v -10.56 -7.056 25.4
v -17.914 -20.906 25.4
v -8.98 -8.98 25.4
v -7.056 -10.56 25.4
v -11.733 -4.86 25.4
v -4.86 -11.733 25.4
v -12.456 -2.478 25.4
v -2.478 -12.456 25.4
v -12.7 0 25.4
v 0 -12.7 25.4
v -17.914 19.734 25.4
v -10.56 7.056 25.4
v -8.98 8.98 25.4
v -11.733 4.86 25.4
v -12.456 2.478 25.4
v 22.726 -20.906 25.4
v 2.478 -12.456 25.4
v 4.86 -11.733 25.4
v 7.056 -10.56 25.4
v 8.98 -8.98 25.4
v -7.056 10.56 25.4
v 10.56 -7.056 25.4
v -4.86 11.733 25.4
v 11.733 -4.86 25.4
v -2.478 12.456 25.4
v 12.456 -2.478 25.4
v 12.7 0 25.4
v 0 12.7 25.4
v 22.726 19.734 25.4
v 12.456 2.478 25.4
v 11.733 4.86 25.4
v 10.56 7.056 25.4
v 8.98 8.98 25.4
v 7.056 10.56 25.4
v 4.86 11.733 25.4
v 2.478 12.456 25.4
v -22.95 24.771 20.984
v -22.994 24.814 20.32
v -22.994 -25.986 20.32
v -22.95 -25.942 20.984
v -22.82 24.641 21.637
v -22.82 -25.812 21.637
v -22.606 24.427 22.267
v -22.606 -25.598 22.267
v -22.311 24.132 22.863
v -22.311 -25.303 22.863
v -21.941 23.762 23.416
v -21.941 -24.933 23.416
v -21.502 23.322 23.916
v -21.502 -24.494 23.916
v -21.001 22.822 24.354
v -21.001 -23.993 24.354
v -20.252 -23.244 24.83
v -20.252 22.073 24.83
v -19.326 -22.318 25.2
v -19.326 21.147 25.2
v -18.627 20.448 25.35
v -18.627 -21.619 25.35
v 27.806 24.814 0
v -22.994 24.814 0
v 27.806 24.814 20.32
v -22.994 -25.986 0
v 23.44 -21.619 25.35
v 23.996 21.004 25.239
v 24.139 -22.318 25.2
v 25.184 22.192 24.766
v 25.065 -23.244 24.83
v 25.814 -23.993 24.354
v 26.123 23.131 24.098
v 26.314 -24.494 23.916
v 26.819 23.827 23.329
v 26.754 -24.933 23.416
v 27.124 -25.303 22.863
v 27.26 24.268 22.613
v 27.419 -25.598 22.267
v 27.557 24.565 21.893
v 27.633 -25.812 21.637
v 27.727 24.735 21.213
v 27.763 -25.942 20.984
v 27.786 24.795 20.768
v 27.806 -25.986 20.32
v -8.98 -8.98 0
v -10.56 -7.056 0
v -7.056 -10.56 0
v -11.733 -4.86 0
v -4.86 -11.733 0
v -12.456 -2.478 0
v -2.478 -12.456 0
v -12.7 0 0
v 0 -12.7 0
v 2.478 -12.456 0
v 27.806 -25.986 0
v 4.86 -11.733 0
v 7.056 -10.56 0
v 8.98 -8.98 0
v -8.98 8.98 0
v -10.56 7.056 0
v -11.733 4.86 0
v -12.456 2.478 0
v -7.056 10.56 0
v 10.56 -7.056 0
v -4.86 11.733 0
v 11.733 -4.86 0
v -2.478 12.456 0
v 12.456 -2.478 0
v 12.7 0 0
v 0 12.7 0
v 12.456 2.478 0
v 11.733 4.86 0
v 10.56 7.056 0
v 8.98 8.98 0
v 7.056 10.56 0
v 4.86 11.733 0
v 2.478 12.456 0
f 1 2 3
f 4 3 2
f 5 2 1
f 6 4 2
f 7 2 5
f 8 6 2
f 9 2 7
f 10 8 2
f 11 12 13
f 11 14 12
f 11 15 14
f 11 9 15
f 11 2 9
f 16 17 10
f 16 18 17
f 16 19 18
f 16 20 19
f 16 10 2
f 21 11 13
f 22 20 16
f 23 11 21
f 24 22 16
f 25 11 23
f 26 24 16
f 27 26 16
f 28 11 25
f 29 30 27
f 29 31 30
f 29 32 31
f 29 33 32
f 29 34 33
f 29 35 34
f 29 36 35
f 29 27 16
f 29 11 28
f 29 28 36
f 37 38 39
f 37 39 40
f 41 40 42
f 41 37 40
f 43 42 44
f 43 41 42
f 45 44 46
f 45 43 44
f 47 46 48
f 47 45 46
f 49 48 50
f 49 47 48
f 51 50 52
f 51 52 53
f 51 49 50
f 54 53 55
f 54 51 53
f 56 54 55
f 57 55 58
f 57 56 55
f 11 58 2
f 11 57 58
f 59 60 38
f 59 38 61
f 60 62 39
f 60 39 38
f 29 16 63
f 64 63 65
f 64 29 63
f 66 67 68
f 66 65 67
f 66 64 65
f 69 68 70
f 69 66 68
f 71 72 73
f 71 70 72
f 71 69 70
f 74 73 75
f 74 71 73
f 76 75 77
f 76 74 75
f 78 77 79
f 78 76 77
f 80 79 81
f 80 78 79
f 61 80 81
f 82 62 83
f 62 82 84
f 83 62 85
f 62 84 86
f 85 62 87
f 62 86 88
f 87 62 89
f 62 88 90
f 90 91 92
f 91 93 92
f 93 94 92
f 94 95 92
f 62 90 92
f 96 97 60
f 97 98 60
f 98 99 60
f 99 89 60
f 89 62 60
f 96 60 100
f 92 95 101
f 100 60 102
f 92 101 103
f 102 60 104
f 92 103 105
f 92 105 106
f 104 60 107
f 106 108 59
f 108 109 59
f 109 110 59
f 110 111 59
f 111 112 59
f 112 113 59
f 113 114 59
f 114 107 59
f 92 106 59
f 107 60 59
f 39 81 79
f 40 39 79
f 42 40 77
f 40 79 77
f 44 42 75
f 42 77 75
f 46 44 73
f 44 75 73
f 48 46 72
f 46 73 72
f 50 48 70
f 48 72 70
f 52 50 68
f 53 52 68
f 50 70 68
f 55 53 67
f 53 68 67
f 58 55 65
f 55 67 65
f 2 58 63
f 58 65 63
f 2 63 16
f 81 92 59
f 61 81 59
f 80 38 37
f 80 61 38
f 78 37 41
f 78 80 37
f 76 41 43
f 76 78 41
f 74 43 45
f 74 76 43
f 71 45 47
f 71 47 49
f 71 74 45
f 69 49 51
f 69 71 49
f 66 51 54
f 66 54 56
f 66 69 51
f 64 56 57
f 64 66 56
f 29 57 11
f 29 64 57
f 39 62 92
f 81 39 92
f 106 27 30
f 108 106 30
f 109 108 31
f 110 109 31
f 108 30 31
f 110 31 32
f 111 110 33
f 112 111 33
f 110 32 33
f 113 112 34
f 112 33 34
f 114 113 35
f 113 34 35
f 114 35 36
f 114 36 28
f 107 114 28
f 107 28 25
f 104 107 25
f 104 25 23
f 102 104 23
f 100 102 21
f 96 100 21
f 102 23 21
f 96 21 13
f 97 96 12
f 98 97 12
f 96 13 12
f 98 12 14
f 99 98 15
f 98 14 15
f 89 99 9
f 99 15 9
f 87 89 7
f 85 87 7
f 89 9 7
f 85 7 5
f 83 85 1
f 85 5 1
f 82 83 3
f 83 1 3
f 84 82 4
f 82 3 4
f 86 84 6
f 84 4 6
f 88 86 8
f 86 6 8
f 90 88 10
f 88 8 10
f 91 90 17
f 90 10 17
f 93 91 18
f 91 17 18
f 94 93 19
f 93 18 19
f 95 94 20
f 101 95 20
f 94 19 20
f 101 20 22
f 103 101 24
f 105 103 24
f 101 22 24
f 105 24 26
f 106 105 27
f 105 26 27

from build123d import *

# Parameters (mm, degrees)
F0_W     = 50.8
F0_H     = 50.8
F1_DEPTH = 25.4
F2_R     = 12.7
F3_DEPTH = 25.4
F4_R     = 5.08


with BuildPart() as f1:
    # F0 (on Top) → F1 (new body)
    with BuildSketch(Plane.XY):
        with Locations((2.406318, -0.585664)):
            Rectangle(F0_W, F0_H)
    extrude(amount=F1_DEPTH)

    # F2 (on face) → F3 (cut)
    with BuildSketch(Plane.XY.offset(25.4)):
        Circle(F2_R)
    extrude(amount=-F3_DEPTH, mode=Mode.SUBTRACT)

    # F4
    f4_edges = [f1.edges().sort_by_distance(p)[0] for p in [
        (2.406318, -25.985664, 25.4),
        (27.806318, -0.585664, 25.4),
        (2.406318, 24.814336, 25.4),
        (-22.993682, -0.585664, 25.4),
    ]]
    fillet(f4_edges, radius=F4_R)


solid = f1.part
